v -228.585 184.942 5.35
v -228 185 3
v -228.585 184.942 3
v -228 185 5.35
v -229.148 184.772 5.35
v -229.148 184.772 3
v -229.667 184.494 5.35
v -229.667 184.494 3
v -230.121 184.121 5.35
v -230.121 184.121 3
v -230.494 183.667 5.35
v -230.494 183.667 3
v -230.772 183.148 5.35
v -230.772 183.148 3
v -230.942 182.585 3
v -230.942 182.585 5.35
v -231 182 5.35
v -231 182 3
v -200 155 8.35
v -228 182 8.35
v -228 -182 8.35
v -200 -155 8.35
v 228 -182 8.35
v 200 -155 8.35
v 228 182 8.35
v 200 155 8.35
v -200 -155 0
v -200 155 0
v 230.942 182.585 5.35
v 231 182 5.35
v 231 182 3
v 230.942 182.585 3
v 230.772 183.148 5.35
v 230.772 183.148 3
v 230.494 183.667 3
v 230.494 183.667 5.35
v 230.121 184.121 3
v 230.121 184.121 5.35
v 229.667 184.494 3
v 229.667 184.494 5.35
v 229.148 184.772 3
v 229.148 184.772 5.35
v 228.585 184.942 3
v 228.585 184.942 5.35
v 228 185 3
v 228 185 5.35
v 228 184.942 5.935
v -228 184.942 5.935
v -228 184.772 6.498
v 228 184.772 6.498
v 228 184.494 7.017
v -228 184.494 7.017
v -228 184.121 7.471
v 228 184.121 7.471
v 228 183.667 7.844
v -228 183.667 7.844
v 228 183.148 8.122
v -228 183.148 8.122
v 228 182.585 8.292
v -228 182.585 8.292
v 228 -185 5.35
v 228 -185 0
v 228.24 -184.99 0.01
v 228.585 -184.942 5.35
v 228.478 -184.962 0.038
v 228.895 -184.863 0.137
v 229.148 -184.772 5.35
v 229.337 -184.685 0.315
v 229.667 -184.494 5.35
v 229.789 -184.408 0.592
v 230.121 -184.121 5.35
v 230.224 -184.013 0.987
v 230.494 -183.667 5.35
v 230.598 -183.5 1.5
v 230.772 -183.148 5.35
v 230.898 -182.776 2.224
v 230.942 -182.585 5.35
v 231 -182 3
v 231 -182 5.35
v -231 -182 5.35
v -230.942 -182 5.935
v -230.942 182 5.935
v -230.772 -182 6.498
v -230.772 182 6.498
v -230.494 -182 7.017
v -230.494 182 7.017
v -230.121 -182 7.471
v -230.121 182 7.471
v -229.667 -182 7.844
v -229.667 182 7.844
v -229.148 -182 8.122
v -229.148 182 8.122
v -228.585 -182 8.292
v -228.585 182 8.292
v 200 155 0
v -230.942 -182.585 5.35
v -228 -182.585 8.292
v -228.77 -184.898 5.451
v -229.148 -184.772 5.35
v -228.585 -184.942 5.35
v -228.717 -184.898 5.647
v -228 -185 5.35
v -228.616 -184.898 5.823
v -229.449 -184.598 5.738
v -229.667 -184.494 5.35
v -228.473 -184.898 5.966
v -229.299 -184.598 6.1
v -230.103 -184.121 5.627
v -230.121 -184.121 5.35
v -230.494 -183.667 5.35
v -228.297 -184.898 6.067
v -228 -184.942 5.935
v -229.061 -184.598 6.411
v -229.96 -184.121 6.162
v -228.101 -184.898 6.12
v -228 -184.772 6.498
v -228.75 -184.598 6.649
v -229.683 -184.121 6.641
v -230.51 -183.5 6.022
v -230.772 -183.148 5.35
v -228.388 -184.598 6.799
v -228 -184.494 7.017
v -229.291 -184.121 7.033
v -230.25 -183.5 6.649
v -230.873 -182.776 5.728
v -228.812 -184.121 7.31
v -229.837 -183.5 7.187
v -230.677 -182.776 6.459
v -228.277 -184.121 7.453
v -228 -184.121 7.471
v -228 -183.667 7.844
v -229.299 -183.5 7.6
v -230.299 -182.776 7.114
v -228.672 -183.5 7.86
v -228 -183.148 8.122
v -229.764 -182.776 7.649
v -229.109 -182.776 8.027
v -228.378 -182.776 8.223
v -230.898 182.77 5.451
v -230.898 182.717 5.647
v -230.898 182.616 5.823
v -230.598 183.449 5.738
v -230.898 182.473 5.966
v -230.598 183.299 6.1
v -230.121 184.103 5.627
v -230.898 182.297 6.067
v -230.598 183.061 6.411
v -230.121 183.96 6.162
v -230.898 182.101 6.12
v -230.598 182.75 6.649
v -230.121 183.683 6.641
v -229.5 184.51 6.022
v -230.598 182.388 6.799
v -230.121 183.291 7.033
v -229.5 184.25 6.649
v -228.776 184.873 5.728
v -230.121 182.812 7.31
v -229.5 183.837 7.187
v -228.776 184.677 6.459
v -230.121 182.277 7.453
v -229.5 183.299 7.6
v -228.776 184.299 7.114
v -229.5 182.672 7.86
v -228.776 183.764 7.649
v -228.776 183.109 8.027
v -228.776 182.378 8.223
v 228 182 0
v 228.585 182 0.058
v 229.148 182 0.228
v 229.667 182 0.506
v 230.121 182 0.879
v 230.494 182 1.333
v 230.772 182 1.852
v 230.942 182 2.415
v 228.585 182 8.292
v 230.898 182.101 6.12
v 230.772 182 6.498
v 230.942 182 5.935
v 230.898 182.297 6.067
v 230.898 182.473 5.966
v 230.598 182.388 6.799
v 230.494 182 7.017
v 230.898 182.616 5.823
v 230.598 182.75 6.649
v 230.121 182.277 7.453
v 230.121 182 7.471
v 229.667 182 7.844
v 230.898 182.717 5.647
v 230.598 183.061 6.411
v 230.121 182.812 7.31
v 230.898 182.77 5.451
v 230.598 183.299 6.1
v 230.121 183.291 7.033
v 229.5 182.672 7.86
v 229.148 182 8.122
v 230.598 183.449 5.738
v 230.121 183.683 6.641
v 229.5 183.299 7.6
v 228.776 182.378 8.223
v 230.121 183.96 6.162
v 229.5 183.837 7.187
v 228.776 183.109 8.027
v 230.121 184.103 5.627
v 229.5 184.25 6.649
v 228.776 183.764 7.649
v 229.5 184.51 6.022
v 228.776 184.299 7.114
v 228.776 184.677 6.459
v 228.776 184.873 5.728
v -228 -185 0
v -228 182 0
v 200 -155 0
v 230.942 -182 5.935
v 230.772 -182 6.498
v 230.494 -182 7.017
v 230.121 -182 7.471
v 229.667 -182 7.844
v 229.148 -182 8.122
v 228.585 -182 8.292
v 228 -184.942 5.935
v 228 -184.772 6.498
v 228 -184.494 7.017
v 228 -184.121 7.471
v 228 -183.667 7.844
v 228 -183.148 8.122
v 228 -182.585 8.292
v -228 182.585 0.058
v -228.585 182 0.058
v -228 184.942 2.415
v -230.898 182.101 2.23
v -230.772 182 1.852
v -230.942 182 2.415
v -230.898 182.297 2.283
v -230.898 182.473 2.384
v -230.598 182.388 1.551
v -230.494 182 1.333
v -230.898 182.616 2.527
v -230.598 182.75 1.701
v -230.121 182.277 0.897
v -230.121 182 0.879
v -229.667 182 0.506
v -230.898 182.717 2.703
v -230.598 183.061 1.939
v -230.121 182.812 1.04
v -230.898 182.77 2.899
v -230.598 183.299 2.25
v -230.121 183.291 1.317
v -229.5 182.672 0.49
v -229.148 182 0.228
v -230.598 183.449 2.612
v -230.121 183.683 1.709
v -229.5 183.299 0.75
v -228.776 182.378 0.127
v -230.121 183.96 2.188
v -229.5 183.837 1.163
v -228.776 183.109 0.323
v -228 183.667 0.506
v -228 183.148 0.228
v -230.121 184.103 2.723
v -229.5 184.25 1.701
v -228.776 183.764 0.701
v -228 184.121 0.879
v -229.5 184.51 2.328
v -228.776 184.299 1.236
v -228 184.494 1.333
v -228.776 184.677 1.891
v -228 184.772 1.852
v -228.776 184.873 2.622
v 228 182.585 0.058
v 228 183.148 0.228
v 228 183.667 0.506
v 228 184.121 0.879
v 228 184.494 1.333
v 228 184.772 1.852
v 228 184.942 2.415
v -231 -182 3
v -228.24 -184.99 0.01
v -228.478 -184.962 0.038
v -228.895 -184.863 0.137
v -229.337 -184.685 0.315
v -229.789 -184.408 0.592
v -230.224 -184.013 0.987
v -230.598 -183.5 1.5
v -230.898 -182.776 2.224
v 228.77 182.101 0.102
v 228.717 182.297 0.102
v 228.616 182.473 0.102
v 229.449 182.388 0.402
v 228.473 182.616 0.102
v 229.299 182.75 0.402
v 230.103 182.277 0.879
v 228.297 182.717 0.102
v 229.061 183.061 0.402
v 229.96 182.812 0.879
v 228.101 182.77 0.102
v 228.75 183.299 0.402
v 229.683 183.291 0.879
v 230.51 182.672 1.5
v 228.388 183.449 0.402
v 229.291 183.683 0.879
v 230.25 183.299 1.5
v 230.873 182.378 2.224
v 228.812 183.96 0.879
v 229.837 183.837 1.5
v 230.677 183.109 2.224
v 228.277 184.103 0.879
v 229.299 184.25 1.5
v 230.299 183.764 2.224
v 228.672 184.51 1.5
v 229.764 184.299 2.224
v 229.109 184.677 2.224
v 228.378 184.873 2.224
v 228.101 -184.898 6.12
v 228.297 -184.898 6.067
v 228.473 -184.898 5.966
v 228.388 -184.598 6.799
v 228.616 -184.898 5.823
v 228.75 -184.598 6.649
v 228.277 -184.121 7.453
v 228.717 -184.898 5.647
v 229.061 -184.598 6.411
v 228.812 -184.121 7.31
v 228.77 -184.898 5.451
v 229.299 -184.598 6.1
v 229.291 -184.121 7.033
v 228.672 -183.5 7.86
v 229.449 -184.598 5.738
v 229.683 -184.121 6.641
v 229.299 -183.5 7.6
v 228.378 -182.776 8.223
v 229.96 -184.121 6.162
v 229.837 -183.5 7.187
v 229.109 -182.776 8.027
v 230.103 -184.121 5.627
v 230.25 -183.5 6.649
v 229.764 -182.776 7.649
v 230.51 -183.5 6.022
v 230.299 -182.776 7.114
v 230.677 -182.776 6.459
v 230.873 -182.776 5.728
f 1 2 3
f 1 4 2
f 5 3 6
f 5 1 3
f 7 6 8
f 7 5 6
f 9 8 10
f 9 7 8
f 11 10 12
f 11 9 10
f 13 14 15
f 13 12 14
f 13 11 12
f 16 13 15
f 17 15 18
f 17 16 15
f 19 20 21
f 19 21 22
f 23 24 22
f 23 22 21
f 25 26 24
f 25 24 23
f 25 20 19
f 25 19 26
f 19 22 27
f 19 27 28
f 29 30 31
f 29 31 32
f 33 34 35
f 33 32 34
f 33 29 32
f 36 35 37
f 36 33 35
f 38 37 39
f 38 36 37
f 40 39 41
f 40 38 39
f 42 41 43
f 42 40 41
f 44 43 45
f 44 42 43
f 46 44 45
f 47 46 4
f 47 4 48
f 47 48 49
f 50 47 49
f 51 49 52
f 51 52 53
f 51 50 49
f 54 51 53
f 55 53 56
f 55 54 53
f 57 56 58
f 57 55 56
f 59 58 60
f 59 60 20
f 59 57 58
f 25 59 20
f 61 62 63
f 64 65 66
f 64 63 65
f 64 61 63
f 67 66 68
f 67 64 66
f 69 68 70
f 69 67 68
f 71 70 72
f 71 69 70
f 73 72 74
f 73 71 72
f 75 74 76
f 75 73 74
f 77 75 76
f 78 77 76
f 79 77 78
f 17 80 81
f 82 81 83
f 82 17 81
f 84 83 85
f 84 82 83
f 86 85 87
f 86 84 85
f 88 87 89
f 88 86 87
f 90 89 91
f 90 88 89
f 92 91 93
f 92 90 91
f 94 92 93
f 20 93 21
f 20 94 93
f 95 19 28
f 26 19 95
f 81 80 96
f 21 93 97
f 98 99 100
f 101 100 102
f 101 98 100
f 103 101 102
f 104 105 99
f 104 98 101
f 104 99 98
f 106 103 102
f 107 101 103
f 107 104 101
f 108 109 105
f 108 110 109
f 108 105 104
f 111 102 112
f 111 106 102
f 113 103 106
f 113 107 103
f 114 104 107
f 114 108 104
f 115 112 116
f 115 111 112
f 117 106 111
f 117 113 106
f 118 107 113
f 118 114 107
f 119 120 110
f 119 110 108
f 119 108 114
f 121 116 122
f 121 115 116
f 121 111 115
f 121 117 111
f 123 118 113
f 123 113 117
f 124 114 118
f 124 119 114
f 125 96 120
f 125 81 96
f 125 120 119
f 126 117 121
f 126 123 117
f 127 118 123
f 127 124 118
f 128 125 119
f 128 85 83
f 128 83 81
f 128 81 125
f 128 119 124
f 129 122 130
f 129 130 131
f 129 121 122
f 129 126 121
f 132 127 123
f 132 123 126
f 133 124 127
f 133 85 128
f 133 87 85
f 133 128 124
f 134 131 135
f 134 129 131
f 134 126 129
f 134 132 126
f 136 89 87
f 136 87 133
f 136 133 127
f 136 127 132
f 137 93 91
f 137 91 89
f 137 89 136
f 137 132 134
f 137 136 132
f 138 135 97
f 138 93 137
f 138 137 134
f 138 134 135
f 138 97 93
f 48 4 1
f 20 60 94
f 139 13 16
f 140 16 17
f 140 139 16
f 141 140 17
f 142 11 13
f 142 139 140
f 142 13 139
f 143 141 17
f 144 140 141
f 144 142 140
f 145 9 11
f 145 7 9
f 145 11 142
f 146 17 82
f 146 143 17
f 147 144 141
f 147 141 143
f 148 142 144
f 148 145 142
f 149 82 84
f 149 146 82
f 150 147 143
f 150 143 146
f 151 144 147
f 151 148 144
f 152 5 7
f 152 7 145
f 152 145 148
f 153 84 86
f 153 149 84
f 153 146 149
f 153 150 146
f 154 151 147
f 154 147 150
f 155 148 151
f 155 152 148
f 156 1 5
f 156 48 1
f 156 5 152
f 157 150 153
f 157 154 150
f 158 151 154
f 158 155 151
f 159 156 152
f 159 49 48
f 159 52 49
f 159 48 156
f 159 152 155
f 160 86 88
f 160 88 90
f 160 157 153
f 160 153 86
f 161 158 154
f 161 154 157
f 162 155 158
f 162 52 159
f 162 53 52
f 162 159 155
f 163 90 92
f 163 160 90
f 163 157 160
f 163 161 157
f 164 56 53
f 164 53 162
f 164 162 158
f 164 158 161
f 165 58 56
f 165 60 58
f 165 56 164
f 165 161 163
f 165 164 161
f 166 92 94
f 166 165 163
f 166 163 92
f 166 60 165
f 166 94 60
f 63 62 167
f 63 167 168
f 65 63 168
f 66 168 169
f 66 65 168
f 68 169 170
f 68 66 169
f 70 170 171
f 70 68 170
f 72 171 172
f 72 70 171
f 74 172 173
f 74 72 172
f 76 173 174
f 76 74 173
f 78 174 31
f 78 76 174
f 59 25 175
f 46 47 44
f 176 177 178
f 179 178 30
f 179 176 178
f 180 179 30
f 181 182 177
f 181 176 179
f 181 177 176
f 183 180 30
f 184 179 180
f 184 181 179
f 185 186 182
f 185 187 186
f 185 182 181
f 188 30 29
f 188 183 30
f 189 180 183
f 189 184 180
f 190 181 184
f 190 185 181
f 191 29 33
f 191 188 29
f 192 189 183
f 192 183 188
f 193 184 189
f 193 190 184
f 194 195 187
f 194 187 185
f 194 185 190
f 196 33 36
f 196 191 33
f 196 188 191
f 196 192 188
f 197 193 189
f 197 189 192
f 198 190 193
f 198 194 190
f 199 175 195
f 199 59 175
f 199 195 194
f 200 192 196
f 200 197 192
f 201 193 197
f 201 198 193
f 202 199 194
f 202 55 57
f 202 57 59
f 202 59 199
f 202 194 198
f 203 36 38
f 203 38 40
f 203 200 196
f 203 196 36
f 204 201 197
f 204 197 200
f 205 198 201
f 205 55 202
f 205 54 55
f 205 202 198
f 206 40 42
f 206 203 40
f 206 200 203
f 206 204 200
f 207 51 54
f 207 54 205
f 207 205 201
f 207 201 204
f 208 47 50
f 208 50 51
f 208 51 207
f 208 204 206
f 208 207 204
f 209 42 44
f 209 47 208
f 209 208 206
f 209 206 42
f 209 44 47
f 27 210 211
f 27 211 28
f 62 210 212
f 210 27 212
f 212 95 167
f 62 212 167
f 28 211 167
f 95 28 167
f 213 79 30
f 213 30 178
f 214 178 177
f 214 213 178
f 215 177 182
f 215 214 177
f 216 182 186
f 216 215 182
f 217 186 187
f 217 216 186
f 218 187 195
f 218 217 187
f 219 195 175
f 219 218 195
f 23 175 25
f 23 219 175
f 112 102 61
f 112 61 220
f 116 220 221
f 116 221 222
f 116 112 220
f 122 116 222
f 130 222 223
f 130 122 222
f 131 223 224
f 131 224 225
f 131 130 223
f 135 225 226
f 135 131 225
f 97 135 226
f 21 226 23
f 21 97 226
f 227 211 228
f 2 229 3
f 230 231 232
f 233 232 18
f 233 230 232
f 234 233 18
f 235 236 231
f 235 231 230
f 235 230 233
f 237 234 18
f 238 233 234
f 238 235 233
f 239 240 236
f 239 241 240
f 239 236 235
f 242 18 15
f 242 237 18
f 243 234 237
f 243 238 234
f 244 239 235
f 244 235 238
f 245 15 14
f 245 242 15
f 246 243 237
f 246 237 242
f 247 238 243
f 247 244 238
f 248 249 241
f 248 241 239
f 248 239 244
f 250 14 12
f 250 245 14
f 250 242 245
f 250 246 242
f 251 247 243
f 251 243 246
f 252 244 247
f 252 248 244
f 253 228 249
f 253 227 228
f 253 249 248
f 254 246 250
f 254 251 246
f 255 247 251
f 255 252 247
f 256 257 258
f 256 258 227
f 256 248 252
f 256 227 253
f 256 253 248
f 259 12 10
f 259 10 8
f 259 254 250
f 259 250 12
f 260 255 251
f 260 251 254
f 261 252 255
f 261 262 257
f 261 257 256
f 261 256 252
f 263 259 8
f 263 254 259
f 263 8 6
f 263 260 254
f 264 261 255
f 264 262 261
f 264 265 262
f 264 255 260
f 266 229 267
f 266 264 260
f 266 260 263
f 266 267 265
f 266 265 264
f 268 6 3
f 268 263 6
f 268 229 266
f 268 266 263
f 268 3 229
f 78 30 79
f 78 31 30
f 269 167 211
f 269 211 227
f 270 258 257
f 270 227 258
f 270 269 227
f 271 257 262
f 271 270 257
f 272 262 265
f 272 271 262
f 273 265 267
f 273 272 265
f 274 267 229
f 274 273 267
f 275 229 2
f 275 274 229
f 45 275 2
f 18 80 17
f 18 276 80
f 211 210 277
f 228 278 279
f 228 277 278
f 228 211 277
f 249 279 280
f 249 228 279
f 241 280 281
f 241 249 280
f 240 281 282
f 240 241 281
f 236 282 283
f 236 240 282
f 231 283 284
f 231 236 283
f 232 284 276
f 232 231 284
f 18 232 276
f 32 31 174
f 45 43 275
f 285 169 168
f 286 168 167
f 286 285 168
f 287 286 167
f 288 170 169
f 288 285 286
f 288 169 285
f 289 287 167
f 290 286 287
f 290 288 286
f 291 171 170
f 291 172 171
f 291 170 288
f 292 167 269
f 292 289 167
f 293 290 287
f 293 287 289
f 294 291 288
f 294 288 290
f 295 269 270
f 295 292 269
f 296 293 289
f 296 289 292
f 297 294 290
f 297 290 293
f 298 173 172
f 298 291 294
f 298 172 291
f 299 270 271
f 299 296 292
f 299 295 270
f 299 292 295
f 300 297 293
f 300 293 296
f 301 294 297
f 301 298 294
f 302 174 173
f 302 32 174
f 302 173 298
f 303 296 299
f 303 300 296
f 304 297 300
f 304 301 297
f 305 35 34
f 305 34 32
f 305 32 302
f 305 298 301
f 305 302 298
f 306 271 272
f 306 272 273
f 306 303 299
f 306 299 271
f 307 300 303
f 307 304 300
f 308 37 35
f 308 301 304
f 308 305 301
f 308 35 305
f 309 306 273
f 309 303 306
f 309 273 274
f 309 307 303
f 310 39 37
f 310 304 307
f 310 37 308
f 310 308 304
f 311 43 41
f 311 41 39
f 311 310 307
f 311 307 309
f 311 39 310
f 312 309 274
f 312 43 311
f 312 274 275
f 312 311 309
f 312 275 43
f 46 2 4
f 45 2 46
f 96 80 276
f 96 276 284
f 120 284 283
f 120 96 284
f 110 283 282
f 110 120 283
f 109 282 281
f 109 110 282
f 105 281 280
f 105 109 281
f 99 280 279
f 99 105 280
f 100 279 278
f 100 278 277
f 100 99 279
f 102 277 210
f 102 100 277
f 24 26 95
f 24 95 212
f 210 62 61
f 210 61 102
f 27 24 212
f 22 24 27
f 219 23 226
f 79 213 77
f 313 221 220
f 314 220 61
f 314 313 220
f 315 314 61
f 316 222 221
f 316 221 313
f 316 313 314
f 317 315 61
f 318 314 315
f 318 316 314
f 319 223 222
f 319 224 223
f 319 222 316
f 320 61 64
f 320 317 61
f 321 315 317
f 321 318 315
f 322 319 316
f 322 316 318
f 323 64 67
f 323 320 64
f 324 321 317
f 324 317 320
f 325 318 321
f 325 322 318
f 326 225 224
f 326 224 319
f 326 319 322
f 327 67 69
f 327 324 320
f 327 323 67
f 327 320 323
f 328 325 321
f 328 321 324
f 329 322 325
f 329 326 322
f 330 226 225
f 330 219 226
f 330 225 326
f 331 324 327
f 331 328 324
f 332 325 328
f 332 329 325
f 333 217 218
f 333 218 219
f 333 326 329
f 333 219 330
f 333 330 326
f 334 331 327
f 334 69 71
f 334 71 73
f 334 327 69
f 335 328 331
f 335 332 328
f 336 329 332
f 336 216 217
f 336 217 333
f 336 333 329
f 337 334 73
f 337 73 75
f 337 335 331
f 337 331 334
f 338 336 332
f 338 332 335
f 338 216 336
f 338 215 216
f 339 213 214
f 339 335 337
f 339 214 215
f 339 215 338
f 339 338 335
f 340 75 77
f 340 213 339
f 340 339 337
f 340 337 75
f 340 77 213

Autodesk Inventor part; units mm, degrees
ref_plane "YZ Plane" through (0, 0, 0) normal (1, 0, 0) x (0, 1, 0)
ref_plane "XZ Plane" through (0, 0, 0) normal (0, 1, 0) x (-1, 0, 0)
ref_plane "XY Plane" through (0, 0, 0) normal (0, 0, 1) x (1, 0, 0)
sketch "スケッチ1" plane through (0, 0, 0) normal (0, 0, 1) x (1, 0, 0)
  line L0 (-231, 185) -> (231, 185)
  line L1 (231, 185) -> (231, -185)
  line L2 (231, -185) -> (-231, -185)
  line L3 (-231, -185) -> (-231, 185)
  line L4 (-231, 185) -> (231, -185) construction
  line L5 (231, 185) -> (-231, -185) construction
  point P0 (0, 0)
  dimension "d0" = 462
  dimension "d1" = 370
extrude "押し出し1" add sketch "スケッチ1" along normal blind 8.35
sketch "スケッチ2" plane through (0, 0, 8.35) normal (0, 0, 1) x (1, 0, 0)
  line L0 (-200, 155) -> (200, 155)
  line L1 (200, 155) -> (200, -155)
  line L2 (200, -155) -> (-200, -155)
  line L3 (-200, -155) -> (-200, 155)
  line L4 (-200, 155) -> (200, -155) construction
  line L5 (200, 155) -> (-200, -155) construction
  point P0 (0, 0)
  dimension "d4" = 400
  dimension "d5" = 310
extrude "押し出し2" cut sketch "スケッチ2" against normal blind 8.35
fillet "フィレット1" radius 3 11 edges at (0, 185, 8.35) (231, 185, 4.175) (0, 185, 0) (-231, 185, 4.175) (-231, 0, 8.35) (231, 0, 8.35) (231, 0, 0) (231, -185, 4.175) (0, -185, 8.35) (-231, -185, 4.175) (-231, 0, 0)
properties part number "upperGom"
